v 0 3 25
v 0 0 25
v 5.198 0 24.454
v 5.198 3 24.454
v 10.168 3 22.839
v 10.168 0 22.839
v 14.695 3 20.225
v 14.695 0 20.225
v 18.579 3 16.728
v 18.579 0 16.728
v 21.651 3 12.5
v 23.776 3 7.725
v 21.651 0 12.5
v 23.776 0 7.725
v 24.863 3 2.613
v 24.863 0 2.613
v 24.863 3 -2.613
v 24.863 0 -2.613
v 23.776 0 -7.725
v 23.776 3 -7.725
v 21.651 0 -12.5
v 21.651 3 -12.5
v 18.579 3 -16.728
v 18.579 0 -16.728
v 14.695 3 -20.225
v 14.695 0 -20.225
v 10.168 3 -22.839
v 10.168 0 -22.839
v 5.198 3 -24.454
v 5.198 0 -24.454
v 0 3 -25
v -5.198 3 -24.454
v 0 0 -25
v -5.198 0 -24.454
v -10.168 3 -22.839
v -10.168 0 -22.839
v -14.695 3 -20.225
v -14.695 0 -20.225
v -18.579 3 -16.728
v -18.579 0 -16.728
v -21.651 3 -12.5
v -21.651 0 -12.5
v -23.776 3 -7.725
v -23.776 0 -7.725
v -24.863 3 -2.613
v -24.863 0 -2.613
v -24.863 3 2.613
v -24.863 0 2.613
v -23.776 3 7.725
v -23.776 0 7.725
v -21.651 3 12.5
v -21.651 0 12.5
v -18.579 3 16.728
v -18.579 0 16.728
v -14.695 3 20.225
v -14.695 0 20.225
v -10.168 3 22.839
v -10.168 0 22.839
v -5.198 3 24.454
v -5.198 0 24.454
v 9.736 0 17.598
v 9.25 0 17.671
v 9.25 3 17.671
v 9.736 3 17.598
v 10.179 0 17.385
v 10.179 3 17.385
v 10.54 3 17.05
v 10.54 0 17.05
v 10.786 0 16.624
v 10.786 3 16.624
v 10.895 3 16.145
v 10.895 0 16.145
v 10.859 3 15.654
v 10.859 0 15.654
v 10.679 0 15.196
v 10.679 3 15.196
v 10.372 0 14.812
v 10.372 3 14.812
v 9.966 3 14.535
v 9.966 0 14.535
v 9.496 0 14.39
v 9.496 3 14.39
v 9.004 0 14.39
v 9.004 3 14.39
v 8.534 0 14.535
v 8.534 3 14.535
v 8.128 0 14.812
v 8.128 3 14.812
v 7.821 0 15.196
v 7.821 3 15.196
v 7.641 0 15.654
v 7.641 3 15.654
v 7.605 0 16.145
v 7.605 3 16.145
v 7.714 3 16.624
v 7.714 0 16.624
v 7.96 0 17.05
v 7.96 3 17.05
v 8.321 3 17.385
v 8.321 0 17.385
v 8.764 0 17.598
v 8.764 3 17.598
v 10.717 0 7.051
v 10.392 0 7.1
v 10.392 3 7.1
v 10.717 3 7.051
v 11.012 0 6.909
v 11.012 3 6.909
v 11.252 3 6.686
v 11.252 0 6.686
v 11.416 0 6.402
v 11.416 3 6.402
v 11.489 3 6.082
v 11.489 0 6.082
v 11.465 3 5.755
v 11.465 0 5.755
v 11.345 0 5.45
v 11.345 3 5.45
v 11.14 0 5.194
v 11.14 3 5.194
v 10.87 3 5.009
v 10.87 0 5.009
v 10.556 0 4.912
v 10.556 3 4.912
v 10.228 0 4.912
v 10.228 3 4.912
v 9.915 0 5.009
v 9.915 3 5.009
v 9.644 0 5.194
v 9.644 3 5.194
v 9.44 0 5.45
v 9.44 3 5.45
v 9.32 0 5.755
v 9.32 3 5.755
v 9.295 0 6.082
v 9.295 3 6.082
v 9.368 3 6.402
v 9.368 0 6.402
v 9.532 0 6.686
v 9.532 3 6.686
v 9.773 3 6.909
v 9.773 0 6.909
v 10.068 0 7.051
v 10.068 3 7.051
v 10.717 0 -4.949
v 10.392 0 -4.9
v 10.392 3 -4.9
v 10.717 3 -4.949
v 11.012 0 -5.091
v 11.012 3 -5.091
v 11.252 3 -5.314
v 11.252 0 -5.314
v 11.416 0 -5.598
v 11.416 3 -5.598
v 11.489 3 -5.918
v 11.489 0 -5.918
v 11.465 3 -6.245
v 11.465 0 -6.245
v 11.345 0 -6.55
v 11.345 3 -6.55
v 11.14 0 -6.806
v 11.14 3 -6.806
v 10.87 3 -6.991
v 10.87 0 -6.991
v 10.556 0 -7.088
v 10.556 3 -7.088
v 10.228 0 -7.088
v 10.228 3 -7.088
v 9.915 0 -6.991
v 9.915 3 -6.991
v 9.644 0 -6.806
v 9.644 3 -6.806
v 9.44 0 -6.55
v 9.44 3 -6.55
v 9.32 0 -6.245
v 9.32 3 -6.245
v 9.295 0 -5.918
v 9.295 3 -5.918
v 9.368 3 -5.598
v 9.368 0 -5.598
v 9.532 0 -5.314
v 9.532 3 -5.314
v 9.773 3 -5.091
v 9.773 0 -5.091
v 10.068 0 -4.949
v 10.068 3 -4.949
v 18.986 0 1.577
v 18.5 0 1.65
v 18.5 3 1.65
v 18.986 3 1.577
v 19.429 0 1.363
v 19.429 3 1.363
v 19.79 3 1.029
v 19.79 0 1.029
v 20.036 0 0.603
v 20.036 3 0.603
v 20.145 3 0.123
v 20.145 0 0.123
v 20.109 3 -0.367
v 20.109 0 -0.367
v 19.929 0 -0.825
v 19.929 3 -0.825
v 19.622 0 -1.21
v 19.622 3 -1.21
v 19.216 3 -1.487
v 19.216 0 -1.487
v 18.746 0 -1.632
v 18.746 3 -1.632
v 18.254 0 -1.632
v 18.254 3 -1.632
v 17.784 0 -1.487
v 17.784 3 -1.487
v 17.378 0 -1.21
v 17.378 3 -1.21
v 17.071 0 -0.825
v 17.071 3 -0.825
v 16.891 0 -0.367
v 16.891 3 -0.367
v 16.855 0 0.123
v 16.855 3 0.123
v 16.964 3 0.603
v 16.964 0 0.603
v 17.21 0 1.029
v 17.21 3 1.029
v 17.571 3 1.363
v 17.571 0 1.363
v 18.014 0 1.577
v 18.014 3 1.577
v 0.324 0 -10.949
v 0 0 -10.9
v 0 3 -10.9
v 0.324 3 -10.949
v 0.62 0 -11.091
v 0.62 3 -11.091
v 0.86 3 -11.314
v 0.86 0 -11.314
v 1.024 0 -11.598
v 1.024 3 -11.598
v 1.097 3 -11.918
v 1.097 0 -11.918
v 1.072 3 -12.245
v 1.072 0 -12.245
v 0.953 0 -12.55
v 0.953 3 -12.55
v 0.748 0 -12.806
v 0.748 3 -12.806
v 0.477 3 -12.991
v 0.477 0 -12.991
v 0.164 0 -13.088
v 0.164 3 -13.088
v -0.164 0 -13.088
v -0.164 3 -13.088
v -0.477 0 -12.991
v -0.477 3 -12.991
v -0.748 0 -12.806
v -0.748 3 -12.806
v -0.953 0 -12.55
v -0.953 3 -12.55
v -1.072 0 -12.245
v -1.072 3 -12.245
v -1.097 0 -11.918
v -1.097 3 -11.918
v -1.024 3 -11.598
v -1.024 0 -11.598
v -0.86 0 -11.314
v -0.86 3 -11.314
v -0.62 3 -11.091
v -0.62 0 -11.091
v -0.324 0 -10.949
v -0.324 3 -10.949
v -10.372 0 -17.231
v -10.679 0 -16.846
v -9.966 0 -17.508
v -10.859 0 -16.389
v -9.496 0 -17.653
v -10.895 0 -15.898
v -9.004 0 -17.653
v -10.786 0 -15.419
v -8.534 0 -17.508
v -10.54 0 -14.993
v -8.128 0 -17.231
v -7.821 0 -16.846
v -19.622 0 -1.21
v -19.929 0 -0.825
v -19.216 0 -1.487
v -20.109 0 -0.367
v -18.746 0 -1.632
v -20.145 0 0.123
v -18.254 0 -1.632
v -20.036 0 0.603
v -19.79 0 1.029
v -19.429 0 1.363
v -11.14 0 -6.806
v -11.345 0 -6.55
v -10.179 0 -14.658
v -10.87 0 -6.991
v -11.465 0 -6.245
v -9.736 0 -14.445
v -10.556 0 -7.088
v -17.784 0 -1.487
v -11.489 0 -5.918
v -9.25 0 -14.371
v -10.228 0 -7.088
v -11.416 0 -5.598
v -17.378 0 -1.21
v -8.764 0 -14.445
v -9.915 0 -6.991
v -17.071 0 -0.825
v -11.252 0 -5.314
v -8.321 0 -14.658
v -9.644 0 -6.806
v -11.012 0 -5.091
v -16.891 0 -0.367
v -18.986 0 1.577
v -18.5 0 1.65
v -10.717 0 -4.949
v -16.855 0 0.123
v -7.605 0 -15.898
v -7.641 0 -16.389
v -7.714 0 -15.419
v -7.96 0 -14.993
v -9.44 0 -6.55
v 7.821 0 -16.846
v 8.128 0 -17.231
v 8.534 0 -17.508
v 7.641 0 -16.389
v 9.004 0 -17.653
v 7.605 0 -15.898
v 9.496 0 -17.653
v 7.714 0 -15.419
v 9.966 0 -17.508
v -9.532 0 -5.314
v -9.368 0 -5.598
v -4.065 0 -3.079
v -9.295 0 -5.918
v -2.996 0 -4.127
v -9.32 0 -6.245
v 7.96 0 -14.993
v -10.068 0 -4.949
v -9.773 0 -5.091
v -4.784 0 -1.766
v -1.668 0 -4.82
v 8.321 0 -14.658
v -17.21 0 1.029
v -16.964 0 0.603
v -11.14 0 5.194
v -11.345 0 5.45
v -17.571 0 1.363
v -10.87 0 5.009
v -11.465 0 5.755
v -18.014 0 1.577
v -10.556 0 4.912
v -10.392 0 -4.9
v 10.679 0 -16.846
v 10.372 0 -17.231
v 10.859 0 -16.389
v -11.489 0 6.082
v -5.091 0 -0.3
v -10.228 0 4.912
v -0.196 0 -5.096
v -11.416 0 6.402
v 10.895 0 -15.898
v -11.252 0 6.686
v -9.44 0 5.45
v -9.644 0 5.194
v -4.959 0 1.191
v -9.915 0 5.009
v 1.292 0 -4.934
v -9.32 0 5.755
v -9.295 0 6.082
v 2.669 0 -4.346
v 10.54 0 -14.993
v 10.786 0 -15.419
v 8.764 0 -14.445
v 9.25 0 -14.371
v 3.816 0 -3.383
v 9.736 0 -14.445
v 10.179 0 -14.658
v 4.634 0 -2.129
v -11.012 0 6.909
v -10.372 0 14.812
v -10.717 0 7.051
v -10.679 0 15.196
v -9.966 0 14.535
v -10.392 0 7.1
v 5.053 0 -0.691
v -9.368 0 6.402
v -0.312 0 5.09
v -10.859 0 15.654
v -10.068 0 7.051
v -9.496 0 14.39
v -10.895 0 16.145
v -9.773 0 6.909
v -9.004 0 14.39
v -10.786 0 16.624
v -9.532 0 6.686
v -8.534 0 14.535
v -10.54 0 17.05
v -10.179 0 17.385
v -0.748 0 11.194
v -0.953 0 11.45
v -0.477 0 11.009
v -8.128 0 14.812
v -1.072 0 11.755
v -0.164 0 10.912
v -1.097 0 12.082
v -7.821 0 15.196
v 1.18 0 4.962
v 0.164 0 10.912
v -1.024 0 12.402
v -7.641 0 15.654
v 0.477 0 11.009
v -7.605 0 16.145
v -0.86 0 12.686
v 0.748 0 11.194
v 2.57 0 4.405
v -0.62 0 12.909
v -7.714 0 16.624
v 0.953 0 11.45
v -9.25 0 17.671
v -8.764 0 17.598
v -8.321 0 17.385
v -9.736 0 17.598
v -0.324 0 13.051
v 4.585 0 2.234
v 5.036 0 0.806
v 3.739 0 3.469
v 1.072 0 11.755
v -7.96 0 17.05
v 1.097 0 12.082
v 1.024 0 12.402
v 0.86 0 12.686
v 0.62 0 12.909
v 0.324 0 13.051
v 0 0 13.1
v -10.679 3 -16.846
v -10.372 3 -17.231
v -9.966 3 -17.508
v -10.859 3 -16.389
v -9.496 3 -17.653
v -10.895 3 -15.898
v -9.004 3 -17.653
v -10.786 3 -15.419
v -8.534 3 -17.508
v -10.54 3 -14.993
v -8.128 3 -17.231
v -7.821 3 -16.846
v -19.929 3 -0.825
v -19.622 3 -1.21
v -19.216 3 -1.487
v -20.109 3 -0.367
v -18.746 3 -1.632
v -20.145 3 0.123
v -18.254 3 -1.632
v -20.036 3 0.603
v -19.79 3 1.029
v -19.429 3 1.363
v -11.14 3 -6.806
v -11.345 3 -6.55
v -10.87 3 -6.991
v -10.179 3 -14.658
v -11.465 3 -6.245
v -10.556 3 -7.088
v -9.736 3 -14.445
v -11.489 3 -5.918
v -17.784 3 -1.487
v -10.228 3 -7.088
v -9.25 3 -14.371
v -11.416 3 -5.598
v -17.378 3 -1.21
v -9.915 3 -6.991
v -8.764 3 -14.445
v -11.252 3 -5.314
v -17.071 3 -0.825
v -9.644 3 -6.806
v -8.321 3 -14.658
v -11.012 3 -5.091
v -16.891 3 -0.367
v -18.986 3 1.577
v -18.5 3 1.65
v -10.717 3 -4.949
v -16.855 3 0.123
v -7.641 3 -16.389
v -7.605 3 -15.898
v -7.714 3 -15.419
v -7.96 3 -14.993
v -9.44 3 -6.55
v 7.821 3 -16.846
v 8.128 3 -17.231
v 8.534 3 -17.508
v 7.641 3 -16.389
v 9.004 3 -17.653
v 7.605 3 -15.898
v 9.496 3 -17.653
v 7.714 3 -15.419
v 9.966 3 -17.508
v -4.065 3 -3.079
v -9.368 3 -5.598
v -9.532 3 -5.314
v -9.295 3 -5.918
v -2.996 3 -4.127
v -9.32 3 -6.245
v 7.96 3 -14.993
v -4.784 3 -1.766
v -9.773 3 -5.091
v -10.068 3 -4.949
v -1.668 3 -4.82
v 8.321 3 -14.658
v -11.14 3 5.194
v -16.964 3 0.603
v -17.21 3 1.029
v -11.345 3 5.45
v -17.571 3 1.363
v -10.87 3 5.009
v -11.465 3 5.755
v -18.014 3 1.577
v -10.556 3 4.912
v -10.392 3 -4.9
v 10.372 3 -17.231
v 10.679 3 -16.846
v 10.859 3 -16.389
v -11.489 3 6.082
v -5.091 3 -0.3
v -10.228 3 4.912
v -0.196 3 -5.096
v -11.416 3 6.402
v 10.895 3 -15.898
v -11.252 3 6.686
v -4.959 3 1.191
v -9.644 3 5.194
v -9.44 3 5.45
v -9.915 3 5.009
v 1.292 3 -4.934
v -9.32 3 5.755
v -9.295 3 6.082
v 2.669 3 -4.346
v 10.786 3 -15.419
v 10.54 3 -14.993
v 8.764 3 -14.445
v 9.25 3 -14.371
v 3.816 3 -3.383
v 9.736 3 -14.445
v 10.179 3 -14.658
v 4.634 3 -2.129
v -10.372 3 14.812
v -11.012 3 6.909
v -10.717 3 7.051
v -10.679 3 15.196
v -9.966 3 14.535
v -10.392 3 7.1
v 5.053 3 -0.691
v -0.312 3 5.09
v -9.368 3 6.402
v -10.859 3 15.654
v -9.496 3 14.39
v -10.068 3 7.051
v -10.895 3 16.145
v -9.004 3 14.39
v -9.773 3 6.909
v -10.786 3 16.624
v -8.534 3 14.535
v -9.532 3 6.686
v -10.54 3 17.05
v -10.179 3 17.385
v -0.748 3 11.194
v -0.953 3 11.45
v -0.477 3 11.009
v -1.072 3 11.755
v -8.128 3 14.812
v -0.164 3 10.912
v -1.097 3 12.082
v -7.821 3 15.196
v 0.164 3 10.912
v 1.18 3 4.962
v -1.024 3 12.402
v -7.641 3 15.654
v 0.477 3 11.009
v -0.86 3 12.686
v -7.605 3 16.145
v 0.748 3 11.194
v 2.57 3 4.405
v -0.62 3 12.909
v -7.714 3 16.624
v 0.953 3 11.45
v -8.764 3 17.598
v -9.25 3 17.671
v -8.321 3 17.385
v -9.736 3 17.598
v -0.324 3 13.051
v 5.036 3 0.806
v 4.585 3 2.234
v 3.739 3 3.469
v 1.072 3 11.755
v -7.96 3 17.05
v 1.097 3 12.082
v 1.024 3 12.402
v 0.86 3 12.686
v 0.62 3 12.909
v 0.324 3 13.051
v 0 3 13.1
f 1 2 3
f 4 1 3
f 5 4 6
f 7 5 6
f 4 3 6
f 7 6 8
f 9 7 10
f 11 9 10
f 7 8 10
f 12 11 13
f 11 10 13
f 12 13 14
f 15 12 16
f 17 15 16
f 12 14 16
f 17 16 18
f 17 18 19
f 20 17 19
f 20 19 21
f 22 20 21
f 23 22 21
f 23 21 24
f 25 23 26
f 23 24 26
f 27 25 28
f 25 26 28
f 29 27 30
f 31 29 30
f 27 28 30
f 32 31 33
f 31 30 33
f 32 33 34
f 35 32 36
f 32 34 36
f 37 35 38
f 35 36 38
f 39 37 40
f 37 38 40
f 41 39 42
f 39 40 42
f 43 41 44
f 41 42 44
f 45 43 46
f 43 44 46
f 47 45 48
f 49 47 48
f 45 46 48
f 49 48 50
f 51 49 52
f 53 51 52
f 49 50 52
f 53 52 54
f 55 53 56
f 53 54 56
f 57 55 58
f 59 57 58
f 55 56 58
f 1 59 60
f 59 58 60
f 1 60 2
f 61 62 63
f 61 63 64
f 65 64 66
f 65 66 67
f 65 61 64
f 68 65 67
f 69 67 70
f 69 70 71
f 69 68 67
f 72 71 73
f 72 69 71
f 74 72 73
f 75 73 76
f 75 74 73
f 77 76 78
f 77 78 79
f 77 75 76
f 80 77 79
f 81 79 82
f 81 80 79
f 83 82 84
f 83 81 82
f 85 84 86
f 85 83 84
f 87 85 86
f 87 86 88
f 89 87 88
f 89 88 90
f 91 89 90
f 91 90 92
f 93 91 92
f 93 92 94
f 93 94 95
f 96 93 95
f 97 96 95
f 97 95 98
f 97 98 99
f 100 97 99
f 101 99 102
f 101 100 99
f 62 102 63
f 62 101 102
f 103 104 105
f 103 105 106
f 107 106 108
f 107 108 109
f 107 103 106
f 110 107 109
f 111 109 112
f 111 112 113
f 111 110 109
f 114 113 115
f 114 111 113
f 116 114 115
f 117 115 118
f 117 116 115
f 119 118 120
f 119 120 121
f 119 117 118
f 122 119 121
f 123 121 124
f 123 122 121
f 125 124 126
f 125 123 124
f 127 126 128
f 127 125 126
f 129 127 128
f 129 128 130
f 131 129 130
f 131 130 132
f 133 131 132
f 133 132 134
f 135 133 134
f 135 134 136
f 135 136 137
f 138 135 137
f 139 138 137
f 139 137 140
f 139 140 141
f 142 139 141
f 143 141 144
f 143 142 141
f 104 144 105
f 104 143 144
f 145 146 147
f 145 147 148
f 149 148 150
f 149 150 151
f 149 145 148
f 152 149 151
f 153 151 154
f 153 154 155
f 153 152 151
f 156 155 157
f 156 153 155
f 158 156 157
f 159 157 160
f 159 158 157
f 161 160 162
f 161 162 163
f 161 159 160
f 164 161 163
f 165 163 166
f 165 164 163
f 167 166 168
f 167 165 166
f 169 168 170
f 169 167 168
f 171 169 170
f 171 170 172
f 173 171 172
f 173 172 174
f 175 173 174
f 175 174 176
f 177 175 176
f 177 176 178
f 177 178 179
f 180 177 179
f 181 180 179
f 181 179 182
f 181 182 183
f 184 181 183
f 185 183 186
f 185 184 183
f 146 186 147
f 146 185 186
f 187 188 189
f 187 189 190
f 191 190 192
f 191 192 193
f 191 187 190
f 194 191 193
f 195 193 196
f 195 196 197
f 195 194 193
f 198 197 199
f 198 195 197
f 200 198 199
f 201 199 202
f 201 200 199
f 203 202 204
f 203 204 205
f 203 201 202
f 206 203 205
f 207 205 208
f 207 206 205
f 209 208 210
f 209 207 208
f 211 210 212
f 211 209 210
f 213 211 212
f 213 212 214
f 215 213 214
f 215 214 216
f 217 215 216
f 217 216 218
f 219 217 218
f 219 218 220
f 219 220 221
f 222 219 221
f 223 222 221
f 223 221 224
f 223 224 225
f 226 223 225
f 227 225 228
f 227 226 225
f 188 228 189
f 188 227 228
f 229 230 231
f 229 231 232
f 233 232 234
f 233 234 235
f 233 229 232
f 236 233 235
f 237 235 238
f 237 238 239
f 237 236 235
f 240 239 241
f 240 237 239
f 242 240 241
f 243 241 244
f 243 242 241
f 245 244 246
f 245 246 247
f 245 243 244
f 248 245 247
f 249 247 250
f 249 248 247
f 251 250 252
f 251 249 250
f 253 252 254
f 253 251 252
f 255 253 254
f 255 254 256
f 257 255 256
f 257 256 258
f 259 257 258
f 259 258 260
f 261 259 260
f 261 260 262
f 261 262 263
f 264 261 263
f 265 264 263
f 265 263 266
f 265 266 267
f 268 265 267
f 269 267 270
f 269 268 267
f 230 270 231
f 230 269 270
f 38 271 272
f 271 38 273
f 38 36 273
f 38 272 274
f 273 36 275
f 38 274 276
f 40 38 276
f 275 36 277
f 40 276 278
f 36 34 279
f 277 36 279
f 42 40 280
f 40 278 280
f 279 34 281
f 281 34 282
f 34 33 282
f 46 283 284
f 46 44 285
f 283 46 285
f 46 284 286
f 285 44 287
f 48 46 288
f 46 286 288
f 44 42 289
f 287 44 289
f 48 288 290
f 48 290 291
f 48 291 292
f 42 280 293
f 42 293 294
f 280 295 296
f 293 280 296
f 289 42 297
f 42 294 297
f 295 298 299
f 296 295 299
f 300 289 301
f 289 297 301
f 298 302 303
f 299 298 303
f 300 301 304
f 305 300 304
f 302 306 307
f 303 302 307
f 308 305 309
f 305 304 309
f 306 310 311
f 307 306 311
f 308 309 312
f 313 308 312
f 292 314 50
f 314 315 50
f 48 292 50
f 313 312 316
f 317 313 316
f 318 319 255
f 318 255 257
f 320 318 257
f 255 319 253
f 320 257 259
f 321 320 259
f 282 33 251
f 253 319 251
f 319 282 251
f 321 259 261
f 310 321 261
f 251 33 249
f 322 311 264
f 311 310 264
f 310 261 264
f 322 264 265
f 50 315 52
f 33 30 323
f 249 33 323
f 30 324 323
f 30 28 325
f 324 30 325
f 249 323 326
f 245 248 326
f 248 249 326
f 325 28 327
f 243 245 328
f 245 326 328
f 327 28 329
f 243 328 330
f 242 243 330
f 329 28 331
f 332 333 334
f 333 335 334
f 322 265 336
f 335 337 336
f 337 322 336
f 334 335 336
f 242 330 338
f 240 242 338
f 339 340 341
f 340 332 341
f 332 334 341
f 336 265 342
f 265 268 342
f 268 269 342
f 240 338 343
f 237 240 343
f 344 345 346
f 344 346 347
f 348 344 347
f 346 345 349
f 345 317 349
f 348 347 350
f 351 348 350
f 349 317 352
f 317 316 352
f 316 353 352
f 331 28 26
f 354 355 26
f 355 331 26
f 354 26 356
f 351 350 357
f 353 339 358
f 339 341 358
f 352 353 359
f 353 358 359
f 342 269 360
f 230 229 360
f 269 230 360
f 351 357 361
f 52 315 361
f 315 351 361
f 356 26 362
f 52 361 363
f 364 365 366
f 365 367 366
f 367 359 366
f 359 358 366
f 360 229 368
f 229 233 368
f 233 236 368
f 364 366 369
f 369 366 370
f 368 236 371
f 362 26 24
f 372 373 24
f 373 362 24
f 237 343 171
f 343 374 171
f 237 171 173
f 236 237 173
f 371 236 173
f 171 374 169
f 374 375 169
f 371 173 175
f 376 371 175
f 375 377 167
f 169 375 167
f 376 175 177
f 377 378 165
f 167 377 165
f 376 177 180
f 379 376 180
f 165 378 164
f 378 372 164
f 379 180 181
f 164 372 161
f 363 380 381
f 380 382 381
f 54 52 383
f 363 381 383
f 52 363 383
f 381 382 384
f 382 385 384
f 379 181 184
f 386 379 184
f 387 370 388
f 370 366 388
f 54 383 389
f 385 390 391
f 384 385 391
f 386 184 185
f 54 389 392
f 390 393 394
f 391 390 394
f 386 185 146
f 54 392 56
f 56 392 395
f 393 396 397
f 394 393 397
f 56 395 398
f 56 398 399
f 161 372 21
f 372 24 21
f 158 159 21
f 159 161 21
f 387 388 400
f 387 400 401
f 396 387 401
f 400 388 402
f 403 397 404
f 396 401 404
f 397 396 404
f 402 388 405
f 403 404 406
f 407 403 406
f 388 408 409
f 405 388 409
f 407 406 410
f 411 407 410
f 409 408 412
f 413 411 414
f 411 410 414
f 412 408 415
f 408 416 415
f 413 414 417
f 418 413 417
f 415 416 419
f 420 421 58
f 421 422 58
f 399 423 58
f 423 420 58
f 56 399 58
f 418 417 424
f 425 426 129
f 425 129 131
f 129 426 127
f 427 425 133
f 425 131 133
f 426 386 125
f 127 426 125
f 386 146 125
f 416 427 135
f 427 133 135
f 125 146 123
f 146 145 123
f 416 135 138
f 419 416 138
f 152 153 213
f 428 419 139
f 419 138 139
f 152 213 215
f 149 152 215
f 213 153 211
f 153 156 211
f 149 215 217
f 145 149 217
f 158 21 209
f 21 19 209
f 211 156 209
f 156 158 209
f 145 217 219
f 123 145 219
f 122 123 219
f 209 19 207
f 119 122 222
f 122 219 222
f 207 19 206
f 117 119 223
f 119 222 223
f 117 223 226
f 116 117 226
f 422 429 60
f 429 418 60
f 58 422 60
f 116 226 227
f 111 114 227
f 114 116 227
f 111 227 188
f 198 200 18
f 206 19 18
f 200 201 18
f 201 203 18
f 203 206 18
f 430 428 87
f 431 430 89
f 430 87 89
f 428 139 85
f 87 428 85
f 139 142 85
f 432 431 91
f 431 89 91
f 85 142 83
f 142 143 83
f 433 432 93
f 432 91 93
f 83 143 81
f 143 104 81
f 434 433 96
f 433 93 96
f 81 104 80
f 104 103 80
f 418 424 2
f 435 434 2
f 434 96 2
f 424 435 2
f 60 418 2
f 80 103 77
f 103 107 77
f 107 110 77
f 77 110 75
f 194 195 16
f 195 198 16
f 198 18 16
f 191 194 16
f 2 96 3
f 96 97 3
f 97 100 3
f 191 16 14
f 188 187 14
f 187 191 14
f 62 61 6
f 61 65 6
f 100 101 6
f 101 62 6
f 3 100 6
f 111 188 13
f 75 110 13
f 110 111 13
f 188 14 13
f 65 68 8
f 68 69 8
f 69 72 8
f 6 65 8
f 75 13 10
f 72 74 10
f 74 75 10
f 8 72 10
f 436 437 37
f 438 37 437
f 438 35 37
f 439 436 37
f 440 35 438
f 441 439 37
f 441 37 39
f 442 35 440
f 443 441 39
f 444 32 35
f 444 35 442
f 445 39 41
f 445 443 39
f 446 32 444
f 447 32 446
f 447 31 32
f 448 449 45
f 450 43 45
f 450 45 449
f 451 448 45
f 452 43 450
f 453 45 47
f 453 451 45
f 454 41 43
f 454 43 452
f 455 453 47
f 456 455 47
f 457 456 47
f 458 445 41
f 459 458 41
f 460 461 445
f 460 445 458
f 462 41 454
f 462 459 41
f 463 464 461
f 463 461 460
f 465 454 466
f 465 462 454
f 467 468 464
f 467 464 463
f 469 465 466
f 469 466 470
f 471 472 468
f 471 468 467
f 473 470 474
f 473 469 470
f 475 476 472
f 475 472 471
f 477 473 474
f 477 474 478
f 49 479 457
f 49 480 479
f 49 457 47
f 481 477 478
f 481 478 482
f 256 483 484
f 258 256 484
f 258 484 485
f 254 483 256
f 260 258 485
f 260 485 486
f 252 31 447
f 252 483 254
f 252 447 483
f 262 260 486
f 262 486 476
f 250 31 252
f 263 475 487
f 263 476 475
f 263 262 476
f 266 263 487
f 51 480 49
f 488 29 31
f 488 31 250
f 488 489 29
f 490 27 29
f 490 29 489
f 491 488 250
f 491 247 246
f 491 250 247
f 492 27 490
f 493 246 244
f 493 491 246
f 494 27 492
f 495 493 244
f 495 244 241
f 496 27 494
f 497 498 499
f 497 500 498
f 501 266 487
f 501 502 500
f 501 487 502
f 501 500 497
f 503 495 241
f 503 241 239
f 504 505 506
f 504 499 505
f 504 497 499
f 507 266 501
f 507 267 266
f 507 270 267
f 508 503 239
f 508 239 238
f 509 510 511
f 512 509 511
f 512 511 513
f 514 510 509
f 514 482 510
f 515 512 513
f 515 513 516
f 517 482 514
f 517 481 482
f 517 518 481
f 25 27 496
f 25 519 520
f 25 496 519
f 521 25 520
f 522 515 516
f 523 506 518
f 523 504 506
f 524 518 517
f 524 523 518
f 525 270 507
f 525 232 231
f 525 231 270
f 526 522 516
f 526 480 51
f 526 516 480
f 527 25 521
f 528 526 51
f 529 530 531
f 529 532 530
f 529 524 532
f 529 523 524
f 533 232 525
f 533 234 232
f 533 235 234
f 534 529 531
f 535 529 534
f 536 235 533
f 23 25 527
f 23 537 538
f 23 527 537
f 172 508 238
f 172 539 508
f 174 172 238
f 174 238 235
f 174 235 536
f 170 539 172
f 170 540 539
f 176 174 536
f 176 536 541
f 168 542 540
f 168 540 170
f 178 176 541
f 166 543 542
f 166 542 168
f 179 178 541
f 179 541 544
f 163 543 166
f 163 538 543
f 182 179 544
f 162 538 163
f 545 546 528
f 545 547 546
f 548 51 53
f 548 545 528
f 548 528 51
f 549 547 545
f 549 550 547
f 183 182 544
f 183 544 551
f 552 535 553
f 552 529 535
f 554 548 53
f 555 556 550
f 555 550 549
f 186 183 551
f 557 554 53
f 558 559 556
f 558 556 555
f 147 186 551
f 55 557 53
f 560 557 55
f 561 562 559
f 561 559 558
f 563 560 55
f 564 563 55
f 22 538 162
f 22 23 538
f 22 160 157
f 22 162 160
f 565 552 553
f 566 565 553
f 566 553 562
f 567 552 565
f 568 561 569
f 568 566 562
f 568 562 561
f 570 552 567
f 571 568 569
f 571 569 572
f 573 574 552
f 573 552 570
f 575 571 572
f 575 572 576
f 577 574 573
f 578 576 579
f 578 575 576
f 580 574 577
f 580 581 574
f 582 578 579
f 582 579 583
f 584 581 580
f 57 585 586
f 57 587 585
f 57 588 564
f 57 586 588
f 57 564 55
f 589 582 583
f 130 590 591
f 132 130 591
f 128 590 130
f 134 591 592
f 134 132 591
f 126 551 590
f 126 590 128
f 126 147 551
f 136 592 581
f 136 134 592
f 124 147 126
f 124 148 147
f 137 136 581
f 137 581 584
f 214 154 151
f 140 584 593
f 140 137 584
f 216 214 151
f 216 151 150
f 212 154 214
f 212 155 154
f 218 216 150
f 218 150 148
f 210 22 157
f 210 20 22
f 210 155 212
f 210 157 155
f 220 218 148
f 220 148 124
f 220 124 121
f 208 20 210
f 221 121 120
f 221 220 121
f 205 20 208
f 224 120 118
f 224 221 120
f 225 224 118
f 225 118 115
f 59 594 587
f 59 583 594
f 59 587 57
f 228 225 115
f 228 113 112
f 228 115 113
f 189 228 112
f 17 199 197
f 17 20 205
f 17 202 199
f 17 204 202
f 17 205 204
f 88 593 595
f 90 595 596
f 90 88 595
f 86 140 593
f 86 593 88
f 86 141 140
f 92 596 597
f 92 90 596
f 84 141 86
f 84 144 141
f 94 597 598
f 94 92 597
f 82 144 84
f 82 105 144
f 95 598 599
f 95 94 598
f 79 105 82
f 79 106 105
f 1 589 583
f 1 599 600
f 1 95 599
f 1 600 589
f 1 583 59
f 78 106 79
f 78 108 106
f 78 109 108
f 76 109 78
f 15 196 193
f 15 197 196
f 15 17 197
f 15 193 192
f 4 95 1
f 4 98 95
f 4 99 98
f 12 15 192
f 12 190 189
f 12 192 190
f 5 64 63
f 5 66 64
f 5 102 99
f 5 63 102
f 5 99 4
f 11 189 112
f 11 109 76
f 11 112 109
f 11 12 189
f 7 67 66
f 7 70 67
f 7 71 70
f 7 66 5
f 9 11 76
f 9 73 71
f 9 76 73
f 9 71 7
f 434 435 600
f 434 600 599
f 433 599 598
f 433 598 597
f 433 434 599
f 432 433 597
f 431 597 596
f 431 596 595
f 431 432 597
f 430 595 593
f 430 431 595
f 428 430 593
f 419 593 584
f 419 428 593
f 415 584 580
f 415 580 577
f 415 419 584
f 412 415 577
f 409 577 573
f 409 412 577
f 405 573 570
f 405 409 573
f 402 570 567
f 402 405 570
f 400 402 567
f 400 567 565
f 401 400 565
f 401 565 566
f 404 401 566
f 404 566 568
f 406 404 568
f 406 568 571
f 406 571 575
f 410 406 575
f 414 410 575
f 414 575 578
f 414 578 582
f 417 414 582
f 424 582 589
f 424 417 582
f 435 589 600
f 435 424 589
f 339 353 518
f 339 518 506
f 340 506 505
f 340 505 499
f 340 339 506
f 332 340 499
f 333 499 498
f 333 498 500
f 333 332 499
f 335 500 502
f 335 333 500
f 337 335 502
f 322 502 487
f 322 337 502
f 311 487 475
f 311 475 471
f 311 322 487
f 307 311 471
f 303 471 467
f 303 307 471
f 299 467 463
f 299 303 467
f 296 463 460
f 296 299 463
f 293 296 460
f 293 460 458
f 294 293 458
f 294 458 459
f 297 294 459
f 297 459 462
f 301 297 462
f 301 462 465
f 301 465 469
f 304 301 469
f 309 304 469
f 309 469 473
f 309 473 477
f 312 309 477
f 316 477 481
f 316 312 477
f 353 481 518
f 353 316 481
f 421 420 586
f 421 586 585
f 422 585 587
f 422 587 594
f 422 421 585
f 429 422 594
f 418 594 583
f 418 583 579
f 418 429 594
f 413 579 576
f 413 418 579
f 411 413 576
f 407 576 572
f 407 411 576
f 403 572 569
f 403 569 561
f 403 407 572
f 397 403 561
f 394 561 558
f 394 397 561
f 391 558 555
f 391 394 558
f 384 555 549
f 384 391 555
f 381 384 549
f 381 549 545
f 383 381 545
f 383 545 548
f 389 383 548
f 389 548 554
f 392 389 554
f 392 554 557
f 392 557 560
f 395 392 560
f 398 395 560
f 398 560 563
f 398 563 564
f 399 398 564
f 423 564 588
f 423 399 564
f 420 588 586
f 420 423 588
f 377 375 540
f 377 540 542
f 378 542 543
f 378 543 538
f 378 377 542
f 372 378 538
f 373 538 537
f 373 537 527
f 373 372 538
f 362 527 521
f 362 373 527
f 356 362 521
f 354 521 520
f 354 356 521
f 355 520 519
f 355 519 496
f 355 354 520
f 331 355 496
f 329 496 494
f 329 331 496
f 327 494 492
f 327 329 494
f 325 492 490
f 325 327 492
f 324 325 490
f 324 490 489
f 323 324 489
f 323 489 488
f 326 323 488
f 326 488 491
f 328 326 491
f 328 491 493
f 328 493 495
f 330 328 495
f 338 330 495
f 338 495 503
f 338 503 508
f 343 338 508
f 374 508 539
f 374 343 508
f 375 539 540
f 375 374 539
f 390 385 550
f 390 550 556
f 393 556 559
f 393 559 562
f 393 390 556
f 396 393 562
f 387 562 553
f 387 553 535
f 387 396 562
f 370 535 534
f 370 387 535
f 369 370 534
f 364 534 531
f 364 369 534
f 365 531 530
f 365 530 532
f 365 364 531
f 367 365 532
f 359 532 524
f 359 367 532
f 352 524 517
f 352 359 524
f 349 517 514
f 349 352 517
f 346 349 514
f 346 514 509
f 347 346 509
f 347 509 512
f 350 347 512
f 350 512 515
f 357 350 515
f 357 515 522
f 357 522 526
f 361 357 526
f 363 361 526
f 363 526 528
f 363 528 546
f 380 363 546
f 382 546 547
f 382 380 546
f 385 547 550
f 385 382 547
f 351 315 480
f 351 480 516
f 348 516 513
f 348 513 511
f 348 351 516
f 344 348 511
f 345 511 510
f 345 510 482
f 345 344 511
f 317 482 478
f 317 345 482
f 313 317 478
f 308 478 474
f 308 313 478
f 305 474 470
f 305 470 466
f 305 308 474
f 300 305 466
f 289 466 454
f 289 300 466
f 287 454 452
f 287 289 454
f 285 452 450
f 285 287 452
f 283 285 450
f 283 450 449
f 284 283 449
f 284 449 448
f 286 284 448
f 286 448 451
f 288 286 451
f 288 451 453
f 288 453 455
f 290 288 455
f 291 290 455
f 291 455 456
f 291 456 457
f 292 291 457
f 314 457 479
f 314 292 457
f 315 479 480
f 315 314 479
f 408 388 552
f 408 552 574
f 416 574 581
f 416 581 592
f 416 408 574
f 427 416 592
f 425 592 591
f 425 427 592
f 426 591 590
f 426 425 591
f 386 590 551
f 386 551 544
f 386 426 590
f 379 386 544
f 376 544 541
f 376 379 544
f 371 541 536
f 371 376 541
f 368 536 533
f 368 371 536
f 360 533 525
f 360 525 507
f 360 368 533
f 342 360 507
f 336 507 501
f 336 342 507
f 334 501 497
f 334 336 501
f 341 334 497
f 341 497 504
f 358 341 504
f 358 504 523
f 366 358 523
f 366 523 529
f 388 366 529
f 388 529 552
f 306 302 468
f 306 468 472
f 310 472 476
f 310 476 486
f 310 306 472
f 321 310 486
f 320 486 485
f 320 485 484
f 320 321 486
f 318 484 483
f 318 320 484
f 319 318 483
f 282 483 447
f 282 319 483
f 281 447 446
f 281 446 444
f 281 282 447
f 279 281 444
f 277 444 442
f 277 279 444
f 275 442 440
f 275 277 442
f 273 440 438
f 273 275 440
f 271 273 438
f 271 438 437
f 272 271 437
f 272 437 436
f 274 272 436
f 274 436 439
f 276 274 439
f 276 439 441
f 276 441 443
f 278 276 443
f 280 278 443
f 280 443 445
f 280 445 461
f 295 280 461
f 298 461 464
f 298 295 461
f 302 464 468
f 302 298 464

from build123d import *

# Parameters (mm, degrees)
SKETCH_1_R      = 25
SKETCH_1_R_2    = 1.1
SKETCH_1_R_3    = 1.65
EXTRUDE_1_DEPTH = 3


with BuildPart() as part:
    # 草图1 → 凸台-拉伸1 (new body)
    with BuildSketch(Plane(origin=(0, 0, 0), x_dir=(1, 0, 0), z_dir=(0, 1, 0))):
        with Locations(Location((0, 0, 0), (0, 0, 270))):
            Circle(SKETCH_1_R)
        with Locations(Location((0, 12, 0), (0, 0, 270))):
            Circle(SKETCH_1_R_2, mode=Mode.SUBTRACT)
        with Locations(Location((-9.25, 16.02146997, 0), (0, 0, 270))):
            Circle(SKETCH_1_R_3, mode=Mode.SUBTRACT)
        with Locations(Location((9.25, 16.02146997, 0), (0, 0, 270))):
            Circle(SKETCH_1_R_3, mode=Mode.SUBTRACT)
        with Locations(Location((10.392304845, 6, 0), (0, 0, 270))):
            Circle(SKETCH_1_R_2, mode=Mode.SUBTRACT)
        with Locations(Location((18.5, 0, 0), (0, 0, 270))):
            Circle(SKETCH_1_R_3, mode=Mode.SUBTRACT)
        with Locations(Location((10.392304845, -6, 0), (0, 0, 270))):
            Circle(SKETCH_1_R_2, mode=Mode.SUBTRACT)
        with Locations(Location((9.25, -16.02146997, 0), (0, 0, 270))):
            Circle(SKETCH_1_R_3, mode=Mode.SUBTRACT)
        with Locations(Location((0, -12, 0), (0, 0, 270))):
            Circle(SKETCH_1_R_2, mode=Mode.SUBTRACT)
        with Locations(Location((-9.25, -16.02146997, 0), (0, 0, 270))):
            Circle(SKETCH_1_R_3, mode=Mode.SUBTRACT)
        with Locations(Location((-10.392304845, -6, 0), (0, 0, 270))):
            Circle(SKETCH_1_R_2, mode=Mode.SUBTRACT)
        with Locations(Location((-18.5, 0, 0), (0, 0, 270))):
            Circle(SKETCH_1_R_3, mode=Mode.SUBTRACT)
        with Locations(Location((-10.392304845, 6, 0), (0, 0, 270))):
            Circle(SKETCH_1_R_2, mode=Mode.SUBTRACT)
        with BuildLine():
            Line((-4.958957038, -1.191110864), (-0.311901361, -5.090453569))
            ThreePointArc((-0.311901361, -5.090453569), (3.278216809, 3.90682666), (-4.958957038, -1.191110864))
        make_face(mode=Mode.SUBTRACT)
    extrude(amount=EXTRUDE_1_DEPTH)


solid = part.part
